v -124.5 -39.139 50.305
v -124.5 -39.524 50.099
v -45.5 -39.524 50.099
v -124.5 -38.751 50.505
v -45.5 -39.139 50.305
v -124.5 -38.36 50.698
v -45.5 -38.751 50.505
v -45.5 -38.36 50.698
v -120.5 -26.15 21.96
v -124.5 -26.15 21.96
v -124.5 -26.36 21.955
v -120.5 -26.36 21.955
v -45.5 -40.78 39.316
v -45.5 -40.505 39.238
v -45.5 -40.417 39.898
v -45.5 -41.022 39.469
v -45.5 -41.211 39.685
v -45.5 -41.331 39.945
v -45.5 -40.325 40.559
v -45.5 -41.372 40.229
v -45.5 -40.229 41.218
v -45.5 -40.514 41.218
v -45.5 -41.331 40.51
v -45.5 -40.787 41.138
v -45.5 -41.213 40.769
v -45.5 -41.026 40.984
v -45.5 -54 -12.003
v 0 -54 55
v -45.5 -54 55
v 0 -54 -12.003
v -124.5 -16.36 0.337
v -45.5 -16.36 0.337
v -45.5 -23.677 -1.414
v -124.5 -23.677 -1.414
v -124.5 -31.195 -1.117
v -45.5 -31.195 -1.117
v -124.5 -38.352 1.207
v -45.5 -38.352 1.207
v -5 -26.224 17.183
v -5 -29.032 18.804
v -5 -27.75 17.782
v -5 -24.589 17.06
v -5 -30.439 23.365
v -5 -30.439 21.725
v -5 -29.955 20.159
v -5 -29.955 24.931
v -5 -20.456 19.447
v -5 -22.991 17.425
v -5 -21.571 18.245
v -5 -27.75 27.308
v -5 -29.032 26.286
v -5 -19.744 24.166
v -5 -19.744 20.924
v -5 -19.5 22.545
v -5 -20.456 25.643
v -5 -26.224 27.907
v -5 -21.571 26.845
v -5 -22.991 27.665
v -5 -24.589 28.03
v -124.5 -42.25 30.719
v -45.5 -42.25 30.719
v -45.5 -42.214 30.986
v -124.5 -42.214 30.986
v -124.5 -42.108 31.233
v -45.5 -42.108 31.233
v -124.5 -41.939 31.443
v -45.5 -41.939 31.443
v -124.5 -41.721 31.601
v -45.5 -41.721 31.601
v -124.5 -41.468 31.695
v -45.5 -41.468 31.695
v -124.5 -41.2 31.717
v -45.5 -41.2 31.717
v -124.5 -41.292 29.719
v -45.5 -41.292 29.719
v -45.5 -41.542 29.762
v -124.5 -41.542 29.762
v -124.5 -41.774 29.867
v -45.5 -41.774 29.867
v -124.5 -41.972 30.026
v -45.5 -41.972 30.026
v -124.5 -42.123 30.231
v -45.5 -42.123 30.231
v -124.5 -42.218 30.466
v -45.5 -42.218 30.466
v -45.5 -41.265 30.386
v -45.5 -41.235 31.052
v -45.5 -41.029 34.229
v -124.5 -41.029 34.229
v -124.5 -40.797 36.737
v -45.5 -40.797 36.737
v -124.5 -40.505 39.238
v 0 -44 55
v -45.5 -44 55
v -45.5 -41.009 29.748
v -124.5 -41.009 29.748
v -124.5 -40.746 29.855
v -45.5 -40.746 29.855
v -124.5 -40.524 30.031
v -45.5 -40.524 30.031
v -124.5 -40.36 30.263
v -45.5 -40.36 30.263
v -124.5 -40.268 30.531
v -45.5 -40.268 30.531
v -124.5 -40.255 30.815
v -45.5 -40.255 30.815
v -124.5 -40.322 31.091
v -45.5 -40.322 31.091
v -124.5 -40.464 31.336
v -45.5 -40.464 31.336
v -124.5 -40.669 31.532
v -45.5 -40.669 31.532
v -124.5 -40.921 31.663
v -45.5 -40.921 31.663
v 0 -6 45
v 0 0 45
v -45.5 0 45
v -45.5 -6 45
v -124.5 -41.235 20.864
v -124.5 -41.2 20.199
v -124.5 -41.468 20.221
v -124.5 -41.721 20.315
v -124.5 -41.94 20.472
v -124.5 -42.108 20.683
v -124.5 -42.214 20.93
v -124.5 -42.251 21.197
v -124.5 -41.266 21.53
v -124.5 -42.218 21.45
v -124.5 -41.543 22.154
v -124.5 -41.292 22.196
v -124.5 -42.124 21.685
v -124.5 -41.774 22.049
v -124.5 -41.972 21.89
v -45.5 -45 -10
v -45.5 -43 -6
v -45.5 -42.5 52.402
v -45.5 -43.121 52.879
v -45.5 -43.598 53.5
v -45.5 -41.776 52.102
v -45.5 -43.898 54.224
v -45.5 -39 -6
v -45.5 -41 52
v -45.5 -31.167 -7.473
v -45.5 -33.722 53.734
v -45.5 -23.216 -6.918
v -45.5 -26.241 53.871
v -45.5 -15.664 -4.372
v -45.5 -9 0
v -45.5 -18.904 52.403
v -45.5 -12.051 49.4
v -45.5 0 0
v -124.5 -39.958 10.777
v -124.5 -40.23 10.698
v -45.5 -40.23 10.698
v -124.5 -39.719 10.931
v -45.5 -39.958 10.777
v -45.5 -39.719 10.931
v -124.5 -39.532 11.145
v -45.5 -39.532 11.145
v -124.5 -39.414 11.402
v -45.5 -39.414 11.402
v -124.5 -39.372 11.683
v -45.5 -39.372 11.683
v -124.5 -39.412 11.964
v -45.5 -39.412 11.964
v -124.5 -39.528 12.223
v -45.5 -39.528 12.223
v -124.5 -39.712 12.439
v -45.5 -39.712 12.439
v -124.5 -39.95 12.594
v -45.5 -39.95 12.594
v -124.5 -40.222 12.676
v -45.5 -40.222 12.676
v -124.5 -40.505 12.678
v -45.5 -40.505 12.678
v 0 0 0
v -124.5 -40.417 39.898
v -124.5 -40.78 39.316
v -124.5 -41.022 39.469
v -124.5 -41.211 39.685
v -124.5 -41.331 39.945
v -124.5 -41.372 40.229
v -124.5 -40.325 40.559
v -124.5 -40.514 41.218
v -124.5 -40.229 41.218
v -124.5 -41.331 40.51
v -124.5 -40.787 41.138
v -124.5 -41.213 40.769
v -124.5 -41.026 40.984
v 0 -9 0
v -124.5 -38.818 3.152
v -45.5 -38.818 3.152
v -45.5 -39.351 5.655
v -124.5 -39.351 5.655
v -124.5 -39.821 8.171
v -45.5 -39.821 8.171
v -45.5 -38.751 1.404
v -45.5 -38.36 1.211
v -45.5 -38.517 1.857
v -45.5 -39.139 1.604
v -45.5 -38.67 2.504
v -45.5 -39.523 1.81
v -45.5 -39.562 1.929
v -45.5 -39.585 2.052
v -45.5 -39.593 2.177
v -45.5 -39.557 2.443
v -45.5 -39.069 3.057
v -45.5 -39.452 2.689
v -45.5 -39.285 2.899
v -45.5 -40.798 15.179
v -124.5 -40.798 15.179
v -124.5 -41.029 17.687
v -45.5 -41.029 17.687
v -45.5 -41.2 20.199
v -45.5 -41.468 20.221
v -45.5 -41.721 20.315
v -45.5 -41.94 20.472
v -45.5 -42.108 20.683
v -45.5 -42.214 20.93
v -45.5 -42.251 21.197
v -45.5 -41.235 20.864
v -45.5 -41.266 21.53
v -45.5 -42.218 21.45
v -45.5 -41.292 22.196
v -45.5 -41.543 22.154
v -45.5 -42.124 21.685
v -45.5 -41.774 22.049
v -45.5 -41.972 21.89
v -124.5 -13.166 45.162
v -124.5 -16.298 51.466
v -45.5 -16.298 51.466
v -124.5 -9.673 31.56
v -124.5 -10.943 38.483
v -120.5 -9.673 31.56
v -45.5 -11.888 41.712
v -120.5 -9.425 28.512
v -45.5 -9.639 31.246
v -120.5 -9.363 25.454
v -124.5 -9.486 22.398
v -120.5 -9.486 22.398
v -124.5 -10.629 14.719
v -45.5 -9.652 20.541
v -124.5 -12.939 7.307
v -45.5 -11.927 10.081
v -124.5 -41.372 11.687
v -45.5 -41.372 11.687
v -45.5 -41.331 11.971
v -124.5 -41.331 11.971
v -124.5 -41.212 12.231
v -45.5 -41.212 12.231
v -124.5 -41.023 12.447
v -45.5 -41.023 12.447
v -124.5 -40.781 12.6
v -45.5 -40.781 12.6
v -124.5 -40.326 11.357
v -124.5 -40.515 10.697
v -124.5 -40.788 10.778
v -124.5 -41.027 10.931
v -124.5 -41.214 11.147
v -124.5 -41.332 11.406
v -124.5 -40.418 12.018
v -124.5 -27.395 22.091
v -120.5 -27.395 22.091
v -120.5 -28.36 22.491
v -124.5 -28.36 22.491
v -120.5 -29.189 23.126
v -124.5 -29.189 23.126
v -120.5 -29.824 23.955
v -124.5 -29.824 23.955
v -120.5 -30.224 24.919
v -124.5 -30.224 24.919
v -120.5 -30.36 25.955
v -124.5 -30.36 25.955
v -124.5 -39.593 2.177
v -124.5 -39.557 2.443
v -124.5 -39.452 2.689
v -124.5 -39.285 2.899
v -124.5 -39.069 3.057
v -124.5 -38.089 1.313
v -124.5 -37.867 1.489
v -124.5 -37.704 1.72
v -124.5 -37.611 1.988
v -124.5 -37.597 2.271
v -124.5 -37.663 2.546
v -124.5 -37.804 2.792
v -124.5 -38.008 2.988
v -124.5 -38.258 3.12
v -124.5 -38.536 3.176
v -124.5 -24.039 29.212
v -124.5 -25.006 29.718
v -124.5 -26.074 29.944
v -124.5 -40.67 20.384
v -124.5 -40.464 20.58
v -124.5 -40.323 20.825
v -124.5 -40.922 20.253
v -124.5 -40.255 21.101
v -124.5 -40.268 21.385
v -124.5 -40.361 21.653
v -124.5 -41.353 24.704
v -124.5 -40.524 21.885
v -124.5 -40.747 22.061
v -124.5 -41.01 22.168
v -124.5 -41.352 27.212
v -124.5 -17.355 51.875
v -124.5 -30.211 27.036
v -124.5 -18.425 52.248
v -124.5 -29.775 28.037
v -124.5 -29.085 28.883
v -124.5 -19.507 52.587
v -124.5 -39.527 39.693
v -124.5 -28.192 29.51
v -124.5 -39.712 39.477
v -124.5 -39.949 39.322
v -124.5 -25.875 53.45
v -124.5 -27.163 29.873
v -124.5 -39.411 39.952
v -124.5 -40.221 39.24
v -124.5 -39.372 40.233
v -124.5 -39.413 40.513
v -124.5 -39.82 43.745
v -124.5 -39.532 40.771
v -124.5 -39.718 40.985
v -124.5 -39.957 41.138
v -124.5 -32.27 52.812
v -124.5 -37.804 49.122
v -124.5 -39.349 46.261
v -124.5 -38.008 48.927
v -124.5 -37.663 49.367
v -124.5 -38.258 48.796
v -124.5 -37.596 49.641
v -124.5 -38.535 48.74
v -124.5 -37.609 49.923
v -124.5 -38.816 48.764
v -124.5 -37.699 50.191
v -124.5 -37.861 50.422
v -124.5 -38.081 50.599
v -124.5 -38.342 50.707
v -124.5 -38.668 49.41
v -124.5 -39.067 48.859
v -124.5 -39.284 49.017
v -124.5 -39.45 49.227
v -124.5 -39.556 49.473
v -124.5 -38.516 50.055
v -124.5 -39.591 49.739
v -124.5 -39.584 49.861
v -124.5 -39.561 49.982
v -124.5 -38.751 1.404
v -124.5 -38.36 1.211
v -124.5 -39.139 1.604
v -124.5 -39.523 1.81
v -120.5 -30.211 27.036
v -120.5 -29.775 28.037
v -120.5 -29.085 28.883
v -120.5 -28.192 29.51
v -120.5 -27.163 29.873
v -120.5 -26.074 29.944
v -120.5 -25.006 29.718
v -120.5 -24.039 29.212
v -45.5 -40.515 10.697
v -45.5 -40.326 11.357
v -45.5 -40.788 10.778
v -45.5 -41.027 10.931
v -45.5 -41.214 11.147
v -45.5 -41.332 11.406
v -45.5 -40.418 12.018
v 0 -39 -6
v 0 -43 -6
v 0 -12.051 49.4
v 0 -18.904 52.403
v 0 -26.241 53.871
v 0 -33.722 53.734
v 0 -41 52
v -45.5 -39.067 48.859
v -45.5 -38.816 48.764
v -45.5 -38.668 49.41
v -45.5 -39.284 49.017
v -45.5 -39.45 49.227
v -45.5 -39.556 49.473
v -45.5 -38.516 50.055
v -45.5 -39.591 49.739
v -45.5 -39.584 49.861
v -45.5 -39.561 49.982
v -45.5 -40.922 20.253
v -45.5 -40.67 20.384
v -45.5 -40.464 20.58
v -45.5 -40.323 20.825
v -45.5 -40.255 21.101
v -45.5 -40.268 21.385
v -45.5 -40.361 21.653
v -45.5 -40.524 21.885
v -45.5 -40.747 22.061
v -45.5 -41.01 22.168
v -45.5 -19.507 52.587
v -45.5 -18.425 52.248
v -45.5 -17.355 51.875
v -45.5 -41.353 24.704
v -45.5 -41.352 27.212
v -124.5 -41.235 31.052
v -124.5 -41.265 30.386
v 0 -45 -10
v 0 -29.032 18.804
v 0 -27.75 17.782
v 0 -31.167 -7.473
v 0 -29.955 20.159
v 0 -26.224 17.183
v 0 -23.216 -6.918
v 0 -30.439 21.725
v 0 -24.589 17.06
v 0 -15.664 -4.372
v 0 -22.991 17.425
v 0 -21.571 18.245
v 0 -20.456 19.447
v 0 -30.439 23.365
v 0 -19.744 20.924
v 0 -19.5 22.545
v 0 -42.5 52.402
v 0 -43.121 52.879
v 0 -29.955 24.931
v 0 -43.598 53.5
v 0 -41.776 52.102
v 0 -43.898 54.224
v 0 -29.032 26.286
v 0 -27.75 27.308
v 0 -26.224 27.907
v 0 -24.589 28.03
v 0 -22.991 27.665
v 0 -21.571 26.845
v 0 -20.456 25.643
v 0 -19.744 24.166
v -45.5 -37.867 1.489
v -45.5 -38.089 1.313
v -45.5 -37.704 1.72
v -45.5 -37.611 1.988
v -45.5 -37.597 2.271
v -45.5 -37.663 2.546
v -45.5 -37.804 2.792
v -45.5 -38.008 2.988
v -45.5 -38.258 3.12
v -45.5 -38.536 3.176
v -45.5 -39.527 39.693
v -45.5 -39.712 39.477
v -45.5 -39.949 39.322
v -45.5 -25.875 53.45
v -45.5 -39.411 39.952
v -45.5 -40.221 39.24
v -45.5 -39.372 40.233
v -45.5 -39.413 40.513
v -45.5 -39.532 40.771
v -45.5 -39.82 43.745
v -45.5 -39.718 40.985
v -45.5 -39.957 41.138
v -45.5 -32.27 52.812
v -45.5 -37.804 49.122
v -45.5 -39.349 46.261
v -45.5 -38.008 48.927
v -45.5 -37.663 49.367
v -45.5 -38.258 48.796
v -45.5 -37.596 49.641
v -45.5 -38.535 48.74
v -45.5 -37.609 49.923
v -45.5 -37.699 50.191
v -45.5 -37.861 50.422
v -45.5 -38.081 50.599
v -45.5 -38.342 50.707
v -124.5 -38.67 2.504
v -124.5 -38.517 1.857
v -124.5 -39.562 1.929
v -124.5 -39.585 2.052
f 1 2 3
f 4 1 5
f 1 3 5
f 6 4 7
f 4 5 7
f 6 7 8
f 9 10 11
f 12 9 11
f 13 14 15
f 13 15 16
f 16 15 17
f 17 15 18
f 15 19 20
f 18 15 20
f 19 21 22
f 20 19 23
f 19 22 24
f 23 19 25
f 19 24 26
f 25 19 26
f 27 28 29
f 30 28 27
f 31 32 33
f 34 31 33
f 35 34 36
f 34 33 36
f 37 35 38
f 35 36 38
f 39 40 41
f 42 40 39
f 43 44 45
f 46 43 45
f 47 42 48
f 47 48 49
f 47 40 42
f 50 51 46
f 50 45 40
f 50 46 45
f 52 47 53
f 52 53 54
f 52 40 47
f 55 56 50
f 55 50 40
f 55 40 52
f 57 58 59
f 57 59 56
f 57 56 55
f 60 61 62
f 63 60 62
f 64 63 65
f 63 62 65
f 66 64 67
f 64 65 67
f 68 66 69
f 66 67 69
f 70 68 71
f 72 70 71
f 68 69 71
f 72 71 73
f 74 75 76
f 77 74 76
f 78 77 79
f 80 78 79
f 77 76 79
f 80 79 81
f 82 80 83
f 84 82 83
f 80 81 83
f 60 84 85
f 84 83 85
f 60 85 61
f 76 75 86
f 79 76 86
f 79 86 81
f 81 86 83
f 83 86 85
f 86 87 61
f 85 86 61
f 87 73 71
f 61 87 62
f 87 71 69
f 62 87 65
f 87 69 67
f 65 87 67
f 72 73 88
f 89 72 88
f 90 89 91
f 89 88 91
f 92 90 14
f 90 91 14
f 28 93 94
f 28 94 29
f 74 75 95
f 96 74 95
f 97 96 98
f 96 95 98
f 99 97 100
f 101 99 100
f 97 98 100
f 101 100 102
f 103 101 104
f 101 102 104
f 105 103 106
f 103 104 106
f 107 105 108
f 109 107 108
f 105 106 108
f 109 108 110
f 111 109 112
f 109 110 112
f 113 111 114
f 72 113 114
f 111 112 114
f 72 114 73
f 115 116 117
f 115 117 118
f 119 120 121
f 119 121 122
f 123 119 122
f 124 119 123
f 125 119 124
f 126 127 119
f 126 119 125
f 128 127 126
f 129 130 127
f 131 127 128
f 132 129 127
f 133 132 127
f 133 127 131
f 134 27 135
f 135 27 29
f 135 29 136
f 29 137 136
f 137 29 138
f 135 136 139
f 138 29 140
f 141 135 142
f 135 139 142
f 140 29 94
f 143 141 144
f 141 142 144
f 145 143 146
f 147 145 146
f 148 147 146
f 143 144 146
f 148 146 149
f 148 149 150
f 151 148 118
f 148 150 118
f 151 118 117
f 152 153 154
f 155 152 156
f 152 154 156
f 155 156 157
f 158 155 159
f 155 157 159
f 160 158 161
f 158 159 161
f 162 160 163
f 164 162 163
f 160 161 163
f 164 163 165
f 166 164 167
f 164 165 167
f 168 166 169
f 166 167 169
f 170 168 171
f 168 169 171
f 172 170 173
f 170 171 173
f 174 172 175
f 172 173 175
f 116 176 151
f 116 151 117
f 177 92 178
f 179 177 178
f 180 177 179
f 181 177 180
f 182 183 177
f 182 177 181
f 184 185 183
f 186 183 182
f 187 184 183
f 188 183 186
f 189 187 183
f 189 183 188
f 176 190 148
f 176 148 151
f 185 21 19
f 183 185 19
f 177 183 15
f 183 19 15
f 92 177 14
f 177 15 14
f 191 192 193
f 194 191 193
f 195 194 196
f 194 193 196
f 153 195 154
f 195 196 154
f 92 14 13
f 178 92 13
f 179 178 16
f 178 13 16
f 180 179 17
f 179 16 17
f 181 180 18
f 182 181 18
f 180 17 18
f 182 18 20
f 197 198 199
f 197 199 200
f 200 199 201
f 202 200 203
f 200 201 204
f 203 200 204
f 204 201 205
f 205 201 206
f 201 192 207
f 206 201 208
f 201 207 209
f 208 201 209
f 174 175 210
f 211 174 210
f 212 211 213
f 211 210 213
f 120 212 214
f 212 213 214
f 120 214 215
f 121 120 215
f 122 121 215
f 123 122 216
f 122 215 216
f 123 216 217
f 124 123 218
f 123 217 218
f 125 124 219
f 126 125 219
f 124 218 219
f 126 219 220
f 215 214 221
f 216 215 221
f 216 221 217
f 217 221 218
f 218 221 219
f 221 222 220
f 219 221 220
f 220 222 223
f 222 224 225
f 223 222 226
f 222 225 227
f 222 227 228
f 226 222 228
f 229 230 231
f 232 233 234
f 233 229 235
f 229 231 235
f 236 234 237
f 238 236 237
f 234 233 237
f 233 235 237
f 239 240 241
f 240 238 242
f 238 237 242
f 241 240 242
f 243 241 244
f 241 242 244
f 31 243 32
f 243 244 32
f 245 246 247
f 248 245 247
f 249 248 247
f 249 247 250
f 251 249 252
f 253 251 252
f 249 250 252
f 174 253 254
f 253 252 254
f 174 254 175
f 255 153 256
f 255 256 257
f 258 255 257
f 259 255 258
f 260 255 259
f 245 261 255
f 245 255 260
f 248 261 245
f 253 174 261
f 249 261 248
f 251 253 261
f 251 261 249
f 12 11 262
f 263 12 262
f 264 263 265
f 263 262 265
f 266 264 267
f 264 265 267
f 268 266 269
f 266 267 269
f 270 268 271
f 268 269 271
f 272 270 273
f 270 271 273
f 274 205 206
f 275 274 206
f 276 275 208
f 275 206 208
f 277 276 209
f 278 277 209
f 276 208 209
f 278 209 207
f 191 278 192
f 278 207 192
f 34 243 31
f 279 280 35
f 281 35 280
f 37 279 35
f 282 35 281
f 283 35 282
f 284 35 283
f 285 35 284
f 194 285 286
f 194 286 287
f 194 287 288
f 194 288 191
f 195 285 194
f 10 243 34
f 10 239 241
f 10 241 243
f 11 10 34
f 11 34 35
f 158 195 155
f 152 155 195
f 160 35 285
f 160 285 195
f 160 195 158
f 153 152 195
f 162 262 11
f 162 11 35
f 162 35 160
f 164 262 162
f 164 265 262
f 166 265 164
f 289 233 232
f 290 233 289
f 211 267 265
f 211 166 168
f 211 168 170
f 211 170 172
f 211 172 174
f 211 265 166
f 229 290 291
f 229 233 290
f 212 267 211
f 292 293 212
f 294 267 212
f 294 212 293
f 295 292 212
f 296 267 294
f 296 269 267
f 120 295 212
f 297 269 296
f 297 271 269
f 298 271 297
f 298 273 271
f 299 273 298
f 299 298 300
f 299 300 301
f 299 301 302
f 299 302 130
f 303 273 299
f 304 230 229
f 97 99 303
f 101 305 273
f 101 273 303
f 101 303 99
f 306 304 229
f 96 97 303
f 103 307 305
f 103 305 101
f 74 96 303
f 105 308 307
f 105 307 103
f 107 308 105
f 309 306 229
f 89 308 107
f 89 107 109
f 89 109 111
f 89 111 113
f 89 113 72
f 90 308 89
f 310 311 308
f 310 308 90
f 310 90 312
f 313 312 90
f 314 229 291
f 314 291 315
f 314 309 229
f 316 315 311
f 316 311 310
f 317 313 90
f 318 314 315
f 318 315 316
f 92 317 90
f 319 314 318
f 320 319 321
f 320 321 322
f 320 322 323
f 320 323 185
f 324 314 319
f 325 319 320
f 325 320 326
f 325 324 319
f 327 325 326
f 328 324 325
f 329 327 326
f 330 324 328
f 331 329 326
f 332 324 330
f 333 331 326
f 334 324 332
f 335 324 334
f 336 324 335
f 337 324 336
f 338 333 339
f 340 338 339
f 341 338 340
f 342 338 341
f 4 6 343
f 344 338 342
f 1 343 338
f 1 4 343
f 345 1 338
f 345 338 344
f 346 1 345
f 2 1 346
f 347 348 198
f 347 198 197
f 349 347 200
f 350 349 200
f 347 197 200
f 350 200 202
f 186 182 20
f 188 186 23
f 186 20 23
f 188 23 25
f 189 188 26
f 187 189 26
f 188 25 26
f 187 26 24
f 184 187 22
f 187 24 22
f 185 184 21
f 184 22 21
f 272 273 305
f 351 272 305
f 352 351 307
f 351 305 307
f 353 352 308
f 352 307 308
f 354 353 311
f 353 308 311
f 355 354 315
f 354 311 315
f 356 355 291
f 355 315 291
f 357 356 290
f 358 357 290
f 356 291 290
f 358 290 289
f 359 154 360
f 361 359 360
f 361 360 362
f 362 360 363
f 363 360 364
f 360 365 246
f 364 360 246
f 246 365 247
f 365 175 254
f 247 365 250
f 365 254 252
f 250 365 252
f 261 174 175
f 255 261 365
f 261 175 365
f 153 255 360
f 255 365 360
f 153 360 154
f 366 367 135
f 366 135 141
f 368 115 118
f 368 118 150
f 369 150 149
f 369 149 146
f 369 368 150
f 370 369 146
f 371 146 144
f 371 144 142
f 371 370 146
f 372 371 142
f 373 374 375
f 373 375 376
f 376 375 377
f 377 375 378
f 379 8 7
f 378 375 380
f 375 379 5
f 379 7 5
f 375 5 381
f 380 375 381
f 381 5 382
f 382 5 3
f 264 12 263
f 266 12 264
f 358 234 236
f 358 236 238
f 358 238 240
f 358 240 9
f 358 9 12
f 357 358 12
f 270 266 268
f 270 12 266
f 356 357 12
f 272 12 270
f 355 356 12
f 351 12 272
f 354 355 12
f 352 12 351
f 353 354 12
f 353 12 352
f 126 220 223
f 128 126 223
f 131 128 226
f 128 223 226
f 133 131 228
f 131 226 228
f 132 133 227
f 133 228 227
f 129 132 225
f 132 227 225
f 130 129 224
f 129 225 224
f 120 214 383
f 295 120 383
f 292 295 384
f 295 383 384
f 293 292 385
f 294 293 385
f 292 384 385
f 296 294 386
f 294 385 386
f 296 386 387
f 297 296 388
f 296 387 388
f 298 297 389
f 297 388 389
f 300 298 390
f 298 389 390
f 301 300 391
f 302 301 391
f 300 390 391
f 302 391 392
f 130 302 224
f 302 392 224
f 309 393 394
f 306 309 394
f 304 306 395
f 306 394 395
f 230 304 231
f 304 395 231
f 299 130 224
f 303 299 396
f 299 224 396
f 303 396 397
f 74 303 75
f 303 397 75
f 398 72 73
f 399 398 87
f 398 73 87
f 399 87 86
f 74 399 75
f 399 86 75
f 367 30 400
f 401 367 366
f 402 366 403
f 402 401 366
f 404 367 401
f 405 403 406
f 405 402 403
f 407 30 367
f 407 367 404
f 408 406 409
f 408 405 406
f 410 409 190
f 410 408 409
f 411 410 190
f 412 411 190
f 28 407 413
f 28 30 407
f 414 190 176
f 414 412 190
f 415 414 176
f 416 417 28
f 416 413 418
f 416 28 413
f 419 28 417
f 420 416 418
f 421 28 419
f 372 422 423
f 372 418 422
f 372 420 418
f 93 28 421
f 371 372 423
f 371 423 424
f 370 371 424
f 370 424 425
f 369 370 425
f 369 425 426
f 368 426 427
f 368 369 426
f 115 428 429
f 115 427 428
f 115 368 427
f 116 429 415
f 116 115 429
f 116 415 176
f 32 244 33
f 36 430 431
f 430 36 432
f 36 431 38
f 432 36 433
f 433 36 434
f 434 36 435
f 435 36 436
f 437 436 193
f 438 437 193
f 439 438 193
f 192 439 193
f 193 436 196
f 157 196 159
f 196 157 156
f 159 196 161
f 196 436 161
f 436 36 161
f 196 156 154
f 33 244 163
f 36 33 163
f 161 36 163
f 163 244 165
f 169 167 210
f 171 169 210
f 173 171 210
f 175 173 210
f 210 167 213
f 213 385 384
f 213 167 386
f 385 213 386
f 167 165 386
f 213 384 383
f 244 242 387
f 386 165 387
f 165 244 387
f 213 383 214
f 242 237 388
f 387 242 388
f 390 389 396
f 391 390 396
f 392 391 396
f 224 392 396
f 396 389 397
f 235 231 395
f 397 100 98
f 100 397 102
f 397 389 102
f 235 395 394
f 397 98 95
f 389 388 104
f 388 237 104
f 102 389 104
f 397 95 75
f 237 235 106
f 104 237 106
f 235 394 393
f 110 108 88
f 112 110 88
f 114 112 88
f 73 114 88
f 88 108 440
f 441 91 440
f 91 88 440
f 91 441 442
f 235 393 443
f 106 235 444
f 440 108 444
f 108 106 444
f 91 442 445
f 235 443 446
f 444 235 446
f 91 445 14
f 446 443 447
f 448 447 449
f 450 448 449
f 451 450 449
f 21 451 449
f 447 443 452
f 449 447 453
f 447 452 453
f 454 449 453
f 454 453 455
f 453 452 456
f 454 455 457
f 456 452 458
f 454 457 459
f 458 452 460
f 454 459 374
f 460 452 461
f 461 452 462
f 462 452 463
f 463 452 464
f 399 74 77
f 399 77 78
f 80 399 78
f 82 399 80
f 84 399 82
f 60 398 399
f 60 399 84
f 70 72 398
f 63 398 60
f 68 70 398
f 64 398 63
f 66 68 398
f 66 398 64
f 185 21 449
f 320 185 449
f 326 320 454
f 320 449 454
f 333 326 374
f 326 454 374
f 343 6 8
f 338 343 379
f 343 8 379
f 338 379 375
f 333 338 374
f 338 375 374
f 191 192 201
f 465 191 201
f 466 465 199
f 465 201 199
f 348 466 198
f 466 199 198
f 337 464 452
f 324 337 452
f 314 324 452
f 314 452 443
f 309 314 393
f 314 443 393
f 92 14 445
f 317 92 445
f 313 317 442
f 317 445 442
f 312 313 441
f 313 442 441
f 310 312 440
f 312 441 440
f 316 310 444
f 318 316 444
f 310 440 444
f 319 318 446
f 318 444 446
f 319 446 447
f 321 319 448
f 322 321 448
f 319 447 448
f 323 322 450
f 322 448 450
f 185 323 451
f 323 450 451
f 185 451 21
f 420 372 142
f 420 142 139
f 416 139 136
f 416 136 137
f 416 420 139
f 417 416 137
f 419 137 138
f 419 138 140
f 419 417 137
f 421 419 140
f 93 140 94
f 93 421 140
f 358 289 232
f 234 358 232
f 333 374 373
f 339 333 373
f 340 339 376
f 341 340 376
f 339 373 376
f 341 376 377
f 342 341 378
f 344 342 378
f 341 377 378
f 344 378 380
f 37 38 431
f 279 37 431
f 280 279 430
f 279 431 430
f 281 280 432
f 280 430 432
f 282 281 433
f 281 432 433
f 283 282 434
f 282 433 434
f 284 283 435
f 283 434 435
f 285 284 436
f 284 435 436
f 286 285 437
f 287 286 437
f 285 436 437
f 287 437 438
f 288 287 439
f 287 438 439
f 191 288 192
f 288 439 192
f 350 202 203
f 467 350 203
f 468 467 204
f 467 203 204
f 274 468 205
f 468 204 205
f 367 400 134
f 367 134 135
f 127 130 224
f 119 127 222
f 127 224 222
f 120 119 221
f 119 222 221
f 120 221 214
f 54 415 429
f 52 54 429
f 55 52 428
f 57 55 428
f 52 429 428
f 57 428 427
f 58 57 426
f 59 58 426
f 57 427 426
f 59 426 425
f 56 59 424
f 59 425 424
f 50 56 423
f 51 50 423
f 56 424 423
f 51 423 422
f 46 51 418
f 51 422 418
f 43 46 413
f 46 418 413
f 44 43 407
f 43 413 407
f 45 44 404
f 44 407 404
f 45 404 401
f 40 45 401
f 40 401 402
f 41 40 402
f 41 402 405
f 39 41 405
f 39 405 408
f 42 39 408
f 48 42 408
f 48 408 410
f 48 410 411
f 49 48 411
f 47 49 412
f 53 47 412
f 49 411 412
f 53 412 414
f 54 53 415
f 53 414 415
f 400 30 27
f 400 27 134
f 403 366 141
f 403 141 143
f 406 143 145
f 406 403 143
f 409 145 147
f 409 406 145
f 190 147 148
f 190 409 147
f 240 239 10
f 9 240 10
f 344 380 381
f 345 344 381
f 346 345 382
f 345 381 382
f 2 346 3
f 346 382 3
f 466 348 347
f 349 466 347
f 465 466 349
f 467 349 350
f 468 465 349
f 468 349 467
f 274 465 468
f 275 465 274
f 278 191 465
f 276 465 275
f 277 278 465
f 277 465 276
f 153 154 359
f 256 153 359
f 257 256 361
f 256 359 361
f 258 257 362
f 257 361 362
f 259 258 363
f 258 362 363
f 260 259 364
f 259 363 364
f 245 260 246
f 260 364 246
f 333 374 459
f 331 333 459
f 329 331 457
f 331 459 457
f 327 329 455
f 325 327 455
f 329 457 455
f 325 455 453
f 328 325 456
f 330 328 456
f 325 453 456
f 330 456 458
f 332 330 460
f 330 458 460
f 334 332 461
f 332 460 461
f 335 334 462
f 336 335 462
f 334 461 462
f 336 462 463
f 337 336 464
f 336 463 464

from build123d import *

# Parameters (mm, degrees)
F1_DEPTH = 45.5
F2_R     = 5.5
F3_DEPTH = 5
F5_DEPTH = 79
F7_DEPTH = 4


# Not quite as in the source:
# - ends of sketch curves that miss each other by under 0.0002 mm in the source are joined


with BuildPart() as f1:
    # F0 (on Right) → F1 (new body)
    with BuildSketch(Plane.YZ):
        with BuildLine():
            Line((-9, 0), (0, 0))
            Line((0, 0), (0, 45))
            Line((0, 45), (-6, 45))
            ThreePointArc((-6, 45), (-22.5330315813, 53.3348420934), (-41, 52))
            ThreePointArc((-41, 52), (-43.1213203436, 52.8786796564), (-44, 55))
            Line((-44, 55), (-54, 55))
            Line((-54, 55), (-54, -12.0034376159))
            Line((-54, -12.0034376159), (-45, -10))
            Line((-45, -10), (-43, -6))
            Line((-43, -6), (-39, -6))
            ThreePointArc((-39, -6), (-23.216376947, -6.9181152652), (-9, 0))
        make_face()
    extrude(amount=-F1_DEPTH)

    # F2 (on face) → F3 (cut)
    with BuildSketch(Plane.YZ):
        with Locations((-25, 22.5448962301)):
            Circle(F2_R)
    extrude(amount=-F3_DEPTH, mode=Mode.SUBTRACT)


with BuildPart() as f5:
    # F4 (on face) → F5 (new body)
    with BuildSketch(Plane(origin=(-45.5, 0, 0), x_dir=(0, -1, 0), z_dir=(-1, 0, 0))):
        with BuildLine():
            ThreePointArc((39.5914929211, 49.738612026), (39.5745273011, 49.9220334198), (39.5242061057, 50.0992310984))
            ThreePointArc((39.5242061057, 50.0992310984), (38.9457342247, 50.4057503771), (38.3601298002, 50.698412714))
            ThreePointArc((38.3601298002, 50.698412714), (38.5929522401, 49.7324279994), (38.8164939134, 48.7642534916))
            ThreePointArc((38.8164939134, 48.7642534916), (39.3741170302, 49.1161174446), (39.5914929211, 49.738612026))
        make_face()
    extrude(amount=F5_DEPTH)


with BuildPart() as f5b:
    # F4 (on face) → F5, piece 2 (new body)
    with BuildSketch(Plane(origin=(-45.5, 0, 0), x_dir=(0, -1, 0), z_dir=(-1, 0, 0))):
        with BuildLine():
            ThreePointArc((38.3601298002, 1.2110405874), (38.9450870807, 1.5033698326), (39.5229280333, 1.8095254158))
            ThreePointArc((39.5229280333, 1.8095254158), (39.5753429364, 1.9901153498), (39.5930229595, 2.1773250267))
            ThreePointArc((39.5930229595, 2.1773250267), (39.3756270427, 2.7998447846), (38.8179612614, 3.1516980355))
            ThreePointArc((38.8179612614, 3.1516980355), (38.5937171125, 2.1802672122), (38.3601298002, 1.2110405874))
        make_face()
    extrude(amount=F5_DEPTH)


with BuildPart() as f5c:
    # F4 (on face) → F5, piece 3 (new body)
    with BuildSketch(Plane(origin=(-45.5, 0, 0), x_dir=(0, -1, 0), z_dir=(-1, 0, 0))):
        with BuildLine():
            ThreePointArc((38.8164939134, 48.7642534916), (37.6200137516, 49.5014871154), (38.342280913, 50.7070609792))
            ThreePointArc((38.342280913, 50.7070609792), (29.091484933, 53.3187486346), (19.5069737394, 52.5871176813))
            ThreePointArc((19.5069737394, 52.5871176813), (17.8887038243, 52.065983046), (16.297847496, 51.4663540199))
            ThreePointArc((16.297847496, 51.4663540199), (9.360167175, 25.8933628751), (16.3601298002, 0.3373497358))
            ThreePointArc((16.3601298002, 0.3373497358), (27.4466468085, -1.5238009807), (38.3515991148, 1.2069052581))
            ThreePointArc((38.3515991148, 1.2069052581), (37.6205916355, 2.4105144775), (38.8179612614, 3.1516980355))
            ThreePointArc((38.8179612614, 3.1516980355), (39.5938697508, 6.9115298603), (40.2298639805, 10.6975410429))
            ThreePointArc((40.2298639805, 10.6975410429), (39.3819781674, 11.8251188452), (40.5054484043, 12.678439816))
            ThreePointArc((40.5054484043, 12.678439816), (40.9213150894, 16.432192603), (41.2000084443, 20.1986146585))
            ThreePointArc((41.2000084443, 20.1986146585), (40.2518346275, 21.2432717627), (41.2919008449, 22.1964791461))
            ThreePointArc((41.2919008449, 22.1964791461), (41.3601297494, 25.9579719584), (41.291665052, 29.7194604864))
            ThreePointArc((41.291665052, 29.7194604864), (40.2515390839, 30.6726026702), (41.1996474134, 31.7173192096))
            ThreePointArc((41.1996474134, 31.7173192096), (40.9207153981, 35.4837514741), (40.5046088311, 39.2375056479))
            ThreePointArc((40.5046088311, 39.2375056479), (39.3810846469, 40.0907555877), (40.2288991693, 41.2183869938))
            ThreePointArc((40.2288991693, 41.2183869938), (39.5926549425, 45.0044147778), (38.8164939134, 48.7642534916))
        make_face()
    extrude(amount=F5_DEPTH)

    # F6 (on face) → F7 (cut)
    with BuildSketch(Plane(origin=(-124.5, 0, 0), x_dir=(0, -1, 0), z_dir=(-1, 0, 0))):
        with BuildLine():
            ThreePointArc((26.1499717328, 21.9602512675), (22.519565713, 24.8366624789), (24.0387774872, 29.212229289))
            Line((24.0387774872, 29.212229289), (9.6729229343, 31.5597305505))
            ThreePointArc((9.6729229343, 31.5597305505), (9.3706290349, 26.98316608), (9.4858426199, 22.3980761372))
            Line((9.4858426199, 22.3980761372), (26.1499717328, 21.9602512675))
        make_face()
        with BuildLine():
            ThreePointArc((26.3601298002, 21.9547266507), (29.188556925, 23.1262995259), (30.3601298002, 25.9547266507))
            ThreePointArc((30.3601298002, 25.9547266507), (28.1924221824, 29.510384765), (24.0387774872, 29.212229289))
            ThreePointArc((24.0387774872, 29.212229289), (22.519565713, 24.8366624789), (26.1499717328, 21.9602512675))
            Line((26.1499717328, 21.9602512675), (26.3601298002, 21.9547266507))
        make_face()
    extrude(amount=-F7_DEPTH, mode=Mode.SUBTRACT)


with BuildPart() as f5d:
    # F4 (on face) → F5, piece 4 (new body)
    with BuildSketch(Plane(origin=(-45.5, 0, 0), x_dir=(0, -1, 0), z_dir=(-1, 0, 0))):
        with BuildLine():
            ThreePointArc((41.3715368681, 40.228612026), (41.026274335, 40.9844683942), (40.2288991693, 41.2183869938))
            ThreePointArc((40.2288991693, 41.2183869938), (40.3715368681, 40.228612026), (40.5046088311, 39.2375056479))
            ThreePointArc((40.5046088311, 39.2375056479), (41.1242227133, 39.5702321824), (41.3715368681, 40.228612026))
        make_face()
    extrude(amount=F5_DEPTH)


with BuildPart() as f5e:
    # F4 (on face) → F5, piece 5 (new body)
    with BuildSketch(Plane(origin=(-45.5, 0, 0), x_dir=(0, -1, 0), z_dir=(-1, 0, 0))):
        with BuildLine():
            ThreePointArc((40.5054484043, 12.678439816), (40.3724391024, 11.6873250267), (40.2298639805, 10.6975410429))
            ThreePointArc((40.2298639805, 10.6975410429), (41.0272004628, 10.9314893561), (41.3724391024, 11.6873250267))
            ThreePointArc((41.3724391024, 11.6873250267), (41.1251041347, 12.3457286635), (40.5054484043, 12.678439816))
        make_face()
    extrude(amount=F5_DEPTH)


with BuildPart() as f5f:
    # F4 (on face) → F5, piece 6 (new body)
    with BuildSketch(Plane(origin=(-45.5, 0, 0), x_dir=(0, -1, 0), z_dir=(-1, 0, 0))):
        with BuildLine():
            ThreePointArc((42.2504800927, 30.718612026), (41.9393804196, 31.443468108), (41.1996474134, 31.7173192096))
            ThreePointArc((41.1996474134, 31.7173192096), (41.2504800927, 30.718612026), (41.291665052, 29.7194604864))
            ThreePointArc((41.291665052, 29.7194604864), (41.9720010416, 30.0262194203), (42.2504800927, 30.718612026))
        make_face()
    extrude(amount=F5_DEPTH)


with BuildPart() as f5g:
    # F4 (on face) → F5, piece 7 (new body)
    with BuildSketch(Plane(origin=(-45.5, 0, 0), x_dir=(0, -1, 0), z_dir=(-1, 0, 0))):
        with BuildLine():
            ThreePointArc((41.2919008449, 22.1964791461), (41.2507785185, 21.1973250267), (41.2000084443, 20.1986146585))
            ThreePointArc((41.2000084443, 20.1986146585), (41.9397015642, 20.4724905372), (42.2507785185, 21.1973250267))
            ThreePointArc((42.2507785185, 21.1973250267), (41.9722777654, 21.8897402466), (41.2919008449, 22.1964791461))
        make_face()
    extrude(amount=F5_DEPTH)


solid = Compound([f1.part, f5.part, f5b.part, f5c.part, f5d.part, f5e.part, f5f.part, f5g.part])
